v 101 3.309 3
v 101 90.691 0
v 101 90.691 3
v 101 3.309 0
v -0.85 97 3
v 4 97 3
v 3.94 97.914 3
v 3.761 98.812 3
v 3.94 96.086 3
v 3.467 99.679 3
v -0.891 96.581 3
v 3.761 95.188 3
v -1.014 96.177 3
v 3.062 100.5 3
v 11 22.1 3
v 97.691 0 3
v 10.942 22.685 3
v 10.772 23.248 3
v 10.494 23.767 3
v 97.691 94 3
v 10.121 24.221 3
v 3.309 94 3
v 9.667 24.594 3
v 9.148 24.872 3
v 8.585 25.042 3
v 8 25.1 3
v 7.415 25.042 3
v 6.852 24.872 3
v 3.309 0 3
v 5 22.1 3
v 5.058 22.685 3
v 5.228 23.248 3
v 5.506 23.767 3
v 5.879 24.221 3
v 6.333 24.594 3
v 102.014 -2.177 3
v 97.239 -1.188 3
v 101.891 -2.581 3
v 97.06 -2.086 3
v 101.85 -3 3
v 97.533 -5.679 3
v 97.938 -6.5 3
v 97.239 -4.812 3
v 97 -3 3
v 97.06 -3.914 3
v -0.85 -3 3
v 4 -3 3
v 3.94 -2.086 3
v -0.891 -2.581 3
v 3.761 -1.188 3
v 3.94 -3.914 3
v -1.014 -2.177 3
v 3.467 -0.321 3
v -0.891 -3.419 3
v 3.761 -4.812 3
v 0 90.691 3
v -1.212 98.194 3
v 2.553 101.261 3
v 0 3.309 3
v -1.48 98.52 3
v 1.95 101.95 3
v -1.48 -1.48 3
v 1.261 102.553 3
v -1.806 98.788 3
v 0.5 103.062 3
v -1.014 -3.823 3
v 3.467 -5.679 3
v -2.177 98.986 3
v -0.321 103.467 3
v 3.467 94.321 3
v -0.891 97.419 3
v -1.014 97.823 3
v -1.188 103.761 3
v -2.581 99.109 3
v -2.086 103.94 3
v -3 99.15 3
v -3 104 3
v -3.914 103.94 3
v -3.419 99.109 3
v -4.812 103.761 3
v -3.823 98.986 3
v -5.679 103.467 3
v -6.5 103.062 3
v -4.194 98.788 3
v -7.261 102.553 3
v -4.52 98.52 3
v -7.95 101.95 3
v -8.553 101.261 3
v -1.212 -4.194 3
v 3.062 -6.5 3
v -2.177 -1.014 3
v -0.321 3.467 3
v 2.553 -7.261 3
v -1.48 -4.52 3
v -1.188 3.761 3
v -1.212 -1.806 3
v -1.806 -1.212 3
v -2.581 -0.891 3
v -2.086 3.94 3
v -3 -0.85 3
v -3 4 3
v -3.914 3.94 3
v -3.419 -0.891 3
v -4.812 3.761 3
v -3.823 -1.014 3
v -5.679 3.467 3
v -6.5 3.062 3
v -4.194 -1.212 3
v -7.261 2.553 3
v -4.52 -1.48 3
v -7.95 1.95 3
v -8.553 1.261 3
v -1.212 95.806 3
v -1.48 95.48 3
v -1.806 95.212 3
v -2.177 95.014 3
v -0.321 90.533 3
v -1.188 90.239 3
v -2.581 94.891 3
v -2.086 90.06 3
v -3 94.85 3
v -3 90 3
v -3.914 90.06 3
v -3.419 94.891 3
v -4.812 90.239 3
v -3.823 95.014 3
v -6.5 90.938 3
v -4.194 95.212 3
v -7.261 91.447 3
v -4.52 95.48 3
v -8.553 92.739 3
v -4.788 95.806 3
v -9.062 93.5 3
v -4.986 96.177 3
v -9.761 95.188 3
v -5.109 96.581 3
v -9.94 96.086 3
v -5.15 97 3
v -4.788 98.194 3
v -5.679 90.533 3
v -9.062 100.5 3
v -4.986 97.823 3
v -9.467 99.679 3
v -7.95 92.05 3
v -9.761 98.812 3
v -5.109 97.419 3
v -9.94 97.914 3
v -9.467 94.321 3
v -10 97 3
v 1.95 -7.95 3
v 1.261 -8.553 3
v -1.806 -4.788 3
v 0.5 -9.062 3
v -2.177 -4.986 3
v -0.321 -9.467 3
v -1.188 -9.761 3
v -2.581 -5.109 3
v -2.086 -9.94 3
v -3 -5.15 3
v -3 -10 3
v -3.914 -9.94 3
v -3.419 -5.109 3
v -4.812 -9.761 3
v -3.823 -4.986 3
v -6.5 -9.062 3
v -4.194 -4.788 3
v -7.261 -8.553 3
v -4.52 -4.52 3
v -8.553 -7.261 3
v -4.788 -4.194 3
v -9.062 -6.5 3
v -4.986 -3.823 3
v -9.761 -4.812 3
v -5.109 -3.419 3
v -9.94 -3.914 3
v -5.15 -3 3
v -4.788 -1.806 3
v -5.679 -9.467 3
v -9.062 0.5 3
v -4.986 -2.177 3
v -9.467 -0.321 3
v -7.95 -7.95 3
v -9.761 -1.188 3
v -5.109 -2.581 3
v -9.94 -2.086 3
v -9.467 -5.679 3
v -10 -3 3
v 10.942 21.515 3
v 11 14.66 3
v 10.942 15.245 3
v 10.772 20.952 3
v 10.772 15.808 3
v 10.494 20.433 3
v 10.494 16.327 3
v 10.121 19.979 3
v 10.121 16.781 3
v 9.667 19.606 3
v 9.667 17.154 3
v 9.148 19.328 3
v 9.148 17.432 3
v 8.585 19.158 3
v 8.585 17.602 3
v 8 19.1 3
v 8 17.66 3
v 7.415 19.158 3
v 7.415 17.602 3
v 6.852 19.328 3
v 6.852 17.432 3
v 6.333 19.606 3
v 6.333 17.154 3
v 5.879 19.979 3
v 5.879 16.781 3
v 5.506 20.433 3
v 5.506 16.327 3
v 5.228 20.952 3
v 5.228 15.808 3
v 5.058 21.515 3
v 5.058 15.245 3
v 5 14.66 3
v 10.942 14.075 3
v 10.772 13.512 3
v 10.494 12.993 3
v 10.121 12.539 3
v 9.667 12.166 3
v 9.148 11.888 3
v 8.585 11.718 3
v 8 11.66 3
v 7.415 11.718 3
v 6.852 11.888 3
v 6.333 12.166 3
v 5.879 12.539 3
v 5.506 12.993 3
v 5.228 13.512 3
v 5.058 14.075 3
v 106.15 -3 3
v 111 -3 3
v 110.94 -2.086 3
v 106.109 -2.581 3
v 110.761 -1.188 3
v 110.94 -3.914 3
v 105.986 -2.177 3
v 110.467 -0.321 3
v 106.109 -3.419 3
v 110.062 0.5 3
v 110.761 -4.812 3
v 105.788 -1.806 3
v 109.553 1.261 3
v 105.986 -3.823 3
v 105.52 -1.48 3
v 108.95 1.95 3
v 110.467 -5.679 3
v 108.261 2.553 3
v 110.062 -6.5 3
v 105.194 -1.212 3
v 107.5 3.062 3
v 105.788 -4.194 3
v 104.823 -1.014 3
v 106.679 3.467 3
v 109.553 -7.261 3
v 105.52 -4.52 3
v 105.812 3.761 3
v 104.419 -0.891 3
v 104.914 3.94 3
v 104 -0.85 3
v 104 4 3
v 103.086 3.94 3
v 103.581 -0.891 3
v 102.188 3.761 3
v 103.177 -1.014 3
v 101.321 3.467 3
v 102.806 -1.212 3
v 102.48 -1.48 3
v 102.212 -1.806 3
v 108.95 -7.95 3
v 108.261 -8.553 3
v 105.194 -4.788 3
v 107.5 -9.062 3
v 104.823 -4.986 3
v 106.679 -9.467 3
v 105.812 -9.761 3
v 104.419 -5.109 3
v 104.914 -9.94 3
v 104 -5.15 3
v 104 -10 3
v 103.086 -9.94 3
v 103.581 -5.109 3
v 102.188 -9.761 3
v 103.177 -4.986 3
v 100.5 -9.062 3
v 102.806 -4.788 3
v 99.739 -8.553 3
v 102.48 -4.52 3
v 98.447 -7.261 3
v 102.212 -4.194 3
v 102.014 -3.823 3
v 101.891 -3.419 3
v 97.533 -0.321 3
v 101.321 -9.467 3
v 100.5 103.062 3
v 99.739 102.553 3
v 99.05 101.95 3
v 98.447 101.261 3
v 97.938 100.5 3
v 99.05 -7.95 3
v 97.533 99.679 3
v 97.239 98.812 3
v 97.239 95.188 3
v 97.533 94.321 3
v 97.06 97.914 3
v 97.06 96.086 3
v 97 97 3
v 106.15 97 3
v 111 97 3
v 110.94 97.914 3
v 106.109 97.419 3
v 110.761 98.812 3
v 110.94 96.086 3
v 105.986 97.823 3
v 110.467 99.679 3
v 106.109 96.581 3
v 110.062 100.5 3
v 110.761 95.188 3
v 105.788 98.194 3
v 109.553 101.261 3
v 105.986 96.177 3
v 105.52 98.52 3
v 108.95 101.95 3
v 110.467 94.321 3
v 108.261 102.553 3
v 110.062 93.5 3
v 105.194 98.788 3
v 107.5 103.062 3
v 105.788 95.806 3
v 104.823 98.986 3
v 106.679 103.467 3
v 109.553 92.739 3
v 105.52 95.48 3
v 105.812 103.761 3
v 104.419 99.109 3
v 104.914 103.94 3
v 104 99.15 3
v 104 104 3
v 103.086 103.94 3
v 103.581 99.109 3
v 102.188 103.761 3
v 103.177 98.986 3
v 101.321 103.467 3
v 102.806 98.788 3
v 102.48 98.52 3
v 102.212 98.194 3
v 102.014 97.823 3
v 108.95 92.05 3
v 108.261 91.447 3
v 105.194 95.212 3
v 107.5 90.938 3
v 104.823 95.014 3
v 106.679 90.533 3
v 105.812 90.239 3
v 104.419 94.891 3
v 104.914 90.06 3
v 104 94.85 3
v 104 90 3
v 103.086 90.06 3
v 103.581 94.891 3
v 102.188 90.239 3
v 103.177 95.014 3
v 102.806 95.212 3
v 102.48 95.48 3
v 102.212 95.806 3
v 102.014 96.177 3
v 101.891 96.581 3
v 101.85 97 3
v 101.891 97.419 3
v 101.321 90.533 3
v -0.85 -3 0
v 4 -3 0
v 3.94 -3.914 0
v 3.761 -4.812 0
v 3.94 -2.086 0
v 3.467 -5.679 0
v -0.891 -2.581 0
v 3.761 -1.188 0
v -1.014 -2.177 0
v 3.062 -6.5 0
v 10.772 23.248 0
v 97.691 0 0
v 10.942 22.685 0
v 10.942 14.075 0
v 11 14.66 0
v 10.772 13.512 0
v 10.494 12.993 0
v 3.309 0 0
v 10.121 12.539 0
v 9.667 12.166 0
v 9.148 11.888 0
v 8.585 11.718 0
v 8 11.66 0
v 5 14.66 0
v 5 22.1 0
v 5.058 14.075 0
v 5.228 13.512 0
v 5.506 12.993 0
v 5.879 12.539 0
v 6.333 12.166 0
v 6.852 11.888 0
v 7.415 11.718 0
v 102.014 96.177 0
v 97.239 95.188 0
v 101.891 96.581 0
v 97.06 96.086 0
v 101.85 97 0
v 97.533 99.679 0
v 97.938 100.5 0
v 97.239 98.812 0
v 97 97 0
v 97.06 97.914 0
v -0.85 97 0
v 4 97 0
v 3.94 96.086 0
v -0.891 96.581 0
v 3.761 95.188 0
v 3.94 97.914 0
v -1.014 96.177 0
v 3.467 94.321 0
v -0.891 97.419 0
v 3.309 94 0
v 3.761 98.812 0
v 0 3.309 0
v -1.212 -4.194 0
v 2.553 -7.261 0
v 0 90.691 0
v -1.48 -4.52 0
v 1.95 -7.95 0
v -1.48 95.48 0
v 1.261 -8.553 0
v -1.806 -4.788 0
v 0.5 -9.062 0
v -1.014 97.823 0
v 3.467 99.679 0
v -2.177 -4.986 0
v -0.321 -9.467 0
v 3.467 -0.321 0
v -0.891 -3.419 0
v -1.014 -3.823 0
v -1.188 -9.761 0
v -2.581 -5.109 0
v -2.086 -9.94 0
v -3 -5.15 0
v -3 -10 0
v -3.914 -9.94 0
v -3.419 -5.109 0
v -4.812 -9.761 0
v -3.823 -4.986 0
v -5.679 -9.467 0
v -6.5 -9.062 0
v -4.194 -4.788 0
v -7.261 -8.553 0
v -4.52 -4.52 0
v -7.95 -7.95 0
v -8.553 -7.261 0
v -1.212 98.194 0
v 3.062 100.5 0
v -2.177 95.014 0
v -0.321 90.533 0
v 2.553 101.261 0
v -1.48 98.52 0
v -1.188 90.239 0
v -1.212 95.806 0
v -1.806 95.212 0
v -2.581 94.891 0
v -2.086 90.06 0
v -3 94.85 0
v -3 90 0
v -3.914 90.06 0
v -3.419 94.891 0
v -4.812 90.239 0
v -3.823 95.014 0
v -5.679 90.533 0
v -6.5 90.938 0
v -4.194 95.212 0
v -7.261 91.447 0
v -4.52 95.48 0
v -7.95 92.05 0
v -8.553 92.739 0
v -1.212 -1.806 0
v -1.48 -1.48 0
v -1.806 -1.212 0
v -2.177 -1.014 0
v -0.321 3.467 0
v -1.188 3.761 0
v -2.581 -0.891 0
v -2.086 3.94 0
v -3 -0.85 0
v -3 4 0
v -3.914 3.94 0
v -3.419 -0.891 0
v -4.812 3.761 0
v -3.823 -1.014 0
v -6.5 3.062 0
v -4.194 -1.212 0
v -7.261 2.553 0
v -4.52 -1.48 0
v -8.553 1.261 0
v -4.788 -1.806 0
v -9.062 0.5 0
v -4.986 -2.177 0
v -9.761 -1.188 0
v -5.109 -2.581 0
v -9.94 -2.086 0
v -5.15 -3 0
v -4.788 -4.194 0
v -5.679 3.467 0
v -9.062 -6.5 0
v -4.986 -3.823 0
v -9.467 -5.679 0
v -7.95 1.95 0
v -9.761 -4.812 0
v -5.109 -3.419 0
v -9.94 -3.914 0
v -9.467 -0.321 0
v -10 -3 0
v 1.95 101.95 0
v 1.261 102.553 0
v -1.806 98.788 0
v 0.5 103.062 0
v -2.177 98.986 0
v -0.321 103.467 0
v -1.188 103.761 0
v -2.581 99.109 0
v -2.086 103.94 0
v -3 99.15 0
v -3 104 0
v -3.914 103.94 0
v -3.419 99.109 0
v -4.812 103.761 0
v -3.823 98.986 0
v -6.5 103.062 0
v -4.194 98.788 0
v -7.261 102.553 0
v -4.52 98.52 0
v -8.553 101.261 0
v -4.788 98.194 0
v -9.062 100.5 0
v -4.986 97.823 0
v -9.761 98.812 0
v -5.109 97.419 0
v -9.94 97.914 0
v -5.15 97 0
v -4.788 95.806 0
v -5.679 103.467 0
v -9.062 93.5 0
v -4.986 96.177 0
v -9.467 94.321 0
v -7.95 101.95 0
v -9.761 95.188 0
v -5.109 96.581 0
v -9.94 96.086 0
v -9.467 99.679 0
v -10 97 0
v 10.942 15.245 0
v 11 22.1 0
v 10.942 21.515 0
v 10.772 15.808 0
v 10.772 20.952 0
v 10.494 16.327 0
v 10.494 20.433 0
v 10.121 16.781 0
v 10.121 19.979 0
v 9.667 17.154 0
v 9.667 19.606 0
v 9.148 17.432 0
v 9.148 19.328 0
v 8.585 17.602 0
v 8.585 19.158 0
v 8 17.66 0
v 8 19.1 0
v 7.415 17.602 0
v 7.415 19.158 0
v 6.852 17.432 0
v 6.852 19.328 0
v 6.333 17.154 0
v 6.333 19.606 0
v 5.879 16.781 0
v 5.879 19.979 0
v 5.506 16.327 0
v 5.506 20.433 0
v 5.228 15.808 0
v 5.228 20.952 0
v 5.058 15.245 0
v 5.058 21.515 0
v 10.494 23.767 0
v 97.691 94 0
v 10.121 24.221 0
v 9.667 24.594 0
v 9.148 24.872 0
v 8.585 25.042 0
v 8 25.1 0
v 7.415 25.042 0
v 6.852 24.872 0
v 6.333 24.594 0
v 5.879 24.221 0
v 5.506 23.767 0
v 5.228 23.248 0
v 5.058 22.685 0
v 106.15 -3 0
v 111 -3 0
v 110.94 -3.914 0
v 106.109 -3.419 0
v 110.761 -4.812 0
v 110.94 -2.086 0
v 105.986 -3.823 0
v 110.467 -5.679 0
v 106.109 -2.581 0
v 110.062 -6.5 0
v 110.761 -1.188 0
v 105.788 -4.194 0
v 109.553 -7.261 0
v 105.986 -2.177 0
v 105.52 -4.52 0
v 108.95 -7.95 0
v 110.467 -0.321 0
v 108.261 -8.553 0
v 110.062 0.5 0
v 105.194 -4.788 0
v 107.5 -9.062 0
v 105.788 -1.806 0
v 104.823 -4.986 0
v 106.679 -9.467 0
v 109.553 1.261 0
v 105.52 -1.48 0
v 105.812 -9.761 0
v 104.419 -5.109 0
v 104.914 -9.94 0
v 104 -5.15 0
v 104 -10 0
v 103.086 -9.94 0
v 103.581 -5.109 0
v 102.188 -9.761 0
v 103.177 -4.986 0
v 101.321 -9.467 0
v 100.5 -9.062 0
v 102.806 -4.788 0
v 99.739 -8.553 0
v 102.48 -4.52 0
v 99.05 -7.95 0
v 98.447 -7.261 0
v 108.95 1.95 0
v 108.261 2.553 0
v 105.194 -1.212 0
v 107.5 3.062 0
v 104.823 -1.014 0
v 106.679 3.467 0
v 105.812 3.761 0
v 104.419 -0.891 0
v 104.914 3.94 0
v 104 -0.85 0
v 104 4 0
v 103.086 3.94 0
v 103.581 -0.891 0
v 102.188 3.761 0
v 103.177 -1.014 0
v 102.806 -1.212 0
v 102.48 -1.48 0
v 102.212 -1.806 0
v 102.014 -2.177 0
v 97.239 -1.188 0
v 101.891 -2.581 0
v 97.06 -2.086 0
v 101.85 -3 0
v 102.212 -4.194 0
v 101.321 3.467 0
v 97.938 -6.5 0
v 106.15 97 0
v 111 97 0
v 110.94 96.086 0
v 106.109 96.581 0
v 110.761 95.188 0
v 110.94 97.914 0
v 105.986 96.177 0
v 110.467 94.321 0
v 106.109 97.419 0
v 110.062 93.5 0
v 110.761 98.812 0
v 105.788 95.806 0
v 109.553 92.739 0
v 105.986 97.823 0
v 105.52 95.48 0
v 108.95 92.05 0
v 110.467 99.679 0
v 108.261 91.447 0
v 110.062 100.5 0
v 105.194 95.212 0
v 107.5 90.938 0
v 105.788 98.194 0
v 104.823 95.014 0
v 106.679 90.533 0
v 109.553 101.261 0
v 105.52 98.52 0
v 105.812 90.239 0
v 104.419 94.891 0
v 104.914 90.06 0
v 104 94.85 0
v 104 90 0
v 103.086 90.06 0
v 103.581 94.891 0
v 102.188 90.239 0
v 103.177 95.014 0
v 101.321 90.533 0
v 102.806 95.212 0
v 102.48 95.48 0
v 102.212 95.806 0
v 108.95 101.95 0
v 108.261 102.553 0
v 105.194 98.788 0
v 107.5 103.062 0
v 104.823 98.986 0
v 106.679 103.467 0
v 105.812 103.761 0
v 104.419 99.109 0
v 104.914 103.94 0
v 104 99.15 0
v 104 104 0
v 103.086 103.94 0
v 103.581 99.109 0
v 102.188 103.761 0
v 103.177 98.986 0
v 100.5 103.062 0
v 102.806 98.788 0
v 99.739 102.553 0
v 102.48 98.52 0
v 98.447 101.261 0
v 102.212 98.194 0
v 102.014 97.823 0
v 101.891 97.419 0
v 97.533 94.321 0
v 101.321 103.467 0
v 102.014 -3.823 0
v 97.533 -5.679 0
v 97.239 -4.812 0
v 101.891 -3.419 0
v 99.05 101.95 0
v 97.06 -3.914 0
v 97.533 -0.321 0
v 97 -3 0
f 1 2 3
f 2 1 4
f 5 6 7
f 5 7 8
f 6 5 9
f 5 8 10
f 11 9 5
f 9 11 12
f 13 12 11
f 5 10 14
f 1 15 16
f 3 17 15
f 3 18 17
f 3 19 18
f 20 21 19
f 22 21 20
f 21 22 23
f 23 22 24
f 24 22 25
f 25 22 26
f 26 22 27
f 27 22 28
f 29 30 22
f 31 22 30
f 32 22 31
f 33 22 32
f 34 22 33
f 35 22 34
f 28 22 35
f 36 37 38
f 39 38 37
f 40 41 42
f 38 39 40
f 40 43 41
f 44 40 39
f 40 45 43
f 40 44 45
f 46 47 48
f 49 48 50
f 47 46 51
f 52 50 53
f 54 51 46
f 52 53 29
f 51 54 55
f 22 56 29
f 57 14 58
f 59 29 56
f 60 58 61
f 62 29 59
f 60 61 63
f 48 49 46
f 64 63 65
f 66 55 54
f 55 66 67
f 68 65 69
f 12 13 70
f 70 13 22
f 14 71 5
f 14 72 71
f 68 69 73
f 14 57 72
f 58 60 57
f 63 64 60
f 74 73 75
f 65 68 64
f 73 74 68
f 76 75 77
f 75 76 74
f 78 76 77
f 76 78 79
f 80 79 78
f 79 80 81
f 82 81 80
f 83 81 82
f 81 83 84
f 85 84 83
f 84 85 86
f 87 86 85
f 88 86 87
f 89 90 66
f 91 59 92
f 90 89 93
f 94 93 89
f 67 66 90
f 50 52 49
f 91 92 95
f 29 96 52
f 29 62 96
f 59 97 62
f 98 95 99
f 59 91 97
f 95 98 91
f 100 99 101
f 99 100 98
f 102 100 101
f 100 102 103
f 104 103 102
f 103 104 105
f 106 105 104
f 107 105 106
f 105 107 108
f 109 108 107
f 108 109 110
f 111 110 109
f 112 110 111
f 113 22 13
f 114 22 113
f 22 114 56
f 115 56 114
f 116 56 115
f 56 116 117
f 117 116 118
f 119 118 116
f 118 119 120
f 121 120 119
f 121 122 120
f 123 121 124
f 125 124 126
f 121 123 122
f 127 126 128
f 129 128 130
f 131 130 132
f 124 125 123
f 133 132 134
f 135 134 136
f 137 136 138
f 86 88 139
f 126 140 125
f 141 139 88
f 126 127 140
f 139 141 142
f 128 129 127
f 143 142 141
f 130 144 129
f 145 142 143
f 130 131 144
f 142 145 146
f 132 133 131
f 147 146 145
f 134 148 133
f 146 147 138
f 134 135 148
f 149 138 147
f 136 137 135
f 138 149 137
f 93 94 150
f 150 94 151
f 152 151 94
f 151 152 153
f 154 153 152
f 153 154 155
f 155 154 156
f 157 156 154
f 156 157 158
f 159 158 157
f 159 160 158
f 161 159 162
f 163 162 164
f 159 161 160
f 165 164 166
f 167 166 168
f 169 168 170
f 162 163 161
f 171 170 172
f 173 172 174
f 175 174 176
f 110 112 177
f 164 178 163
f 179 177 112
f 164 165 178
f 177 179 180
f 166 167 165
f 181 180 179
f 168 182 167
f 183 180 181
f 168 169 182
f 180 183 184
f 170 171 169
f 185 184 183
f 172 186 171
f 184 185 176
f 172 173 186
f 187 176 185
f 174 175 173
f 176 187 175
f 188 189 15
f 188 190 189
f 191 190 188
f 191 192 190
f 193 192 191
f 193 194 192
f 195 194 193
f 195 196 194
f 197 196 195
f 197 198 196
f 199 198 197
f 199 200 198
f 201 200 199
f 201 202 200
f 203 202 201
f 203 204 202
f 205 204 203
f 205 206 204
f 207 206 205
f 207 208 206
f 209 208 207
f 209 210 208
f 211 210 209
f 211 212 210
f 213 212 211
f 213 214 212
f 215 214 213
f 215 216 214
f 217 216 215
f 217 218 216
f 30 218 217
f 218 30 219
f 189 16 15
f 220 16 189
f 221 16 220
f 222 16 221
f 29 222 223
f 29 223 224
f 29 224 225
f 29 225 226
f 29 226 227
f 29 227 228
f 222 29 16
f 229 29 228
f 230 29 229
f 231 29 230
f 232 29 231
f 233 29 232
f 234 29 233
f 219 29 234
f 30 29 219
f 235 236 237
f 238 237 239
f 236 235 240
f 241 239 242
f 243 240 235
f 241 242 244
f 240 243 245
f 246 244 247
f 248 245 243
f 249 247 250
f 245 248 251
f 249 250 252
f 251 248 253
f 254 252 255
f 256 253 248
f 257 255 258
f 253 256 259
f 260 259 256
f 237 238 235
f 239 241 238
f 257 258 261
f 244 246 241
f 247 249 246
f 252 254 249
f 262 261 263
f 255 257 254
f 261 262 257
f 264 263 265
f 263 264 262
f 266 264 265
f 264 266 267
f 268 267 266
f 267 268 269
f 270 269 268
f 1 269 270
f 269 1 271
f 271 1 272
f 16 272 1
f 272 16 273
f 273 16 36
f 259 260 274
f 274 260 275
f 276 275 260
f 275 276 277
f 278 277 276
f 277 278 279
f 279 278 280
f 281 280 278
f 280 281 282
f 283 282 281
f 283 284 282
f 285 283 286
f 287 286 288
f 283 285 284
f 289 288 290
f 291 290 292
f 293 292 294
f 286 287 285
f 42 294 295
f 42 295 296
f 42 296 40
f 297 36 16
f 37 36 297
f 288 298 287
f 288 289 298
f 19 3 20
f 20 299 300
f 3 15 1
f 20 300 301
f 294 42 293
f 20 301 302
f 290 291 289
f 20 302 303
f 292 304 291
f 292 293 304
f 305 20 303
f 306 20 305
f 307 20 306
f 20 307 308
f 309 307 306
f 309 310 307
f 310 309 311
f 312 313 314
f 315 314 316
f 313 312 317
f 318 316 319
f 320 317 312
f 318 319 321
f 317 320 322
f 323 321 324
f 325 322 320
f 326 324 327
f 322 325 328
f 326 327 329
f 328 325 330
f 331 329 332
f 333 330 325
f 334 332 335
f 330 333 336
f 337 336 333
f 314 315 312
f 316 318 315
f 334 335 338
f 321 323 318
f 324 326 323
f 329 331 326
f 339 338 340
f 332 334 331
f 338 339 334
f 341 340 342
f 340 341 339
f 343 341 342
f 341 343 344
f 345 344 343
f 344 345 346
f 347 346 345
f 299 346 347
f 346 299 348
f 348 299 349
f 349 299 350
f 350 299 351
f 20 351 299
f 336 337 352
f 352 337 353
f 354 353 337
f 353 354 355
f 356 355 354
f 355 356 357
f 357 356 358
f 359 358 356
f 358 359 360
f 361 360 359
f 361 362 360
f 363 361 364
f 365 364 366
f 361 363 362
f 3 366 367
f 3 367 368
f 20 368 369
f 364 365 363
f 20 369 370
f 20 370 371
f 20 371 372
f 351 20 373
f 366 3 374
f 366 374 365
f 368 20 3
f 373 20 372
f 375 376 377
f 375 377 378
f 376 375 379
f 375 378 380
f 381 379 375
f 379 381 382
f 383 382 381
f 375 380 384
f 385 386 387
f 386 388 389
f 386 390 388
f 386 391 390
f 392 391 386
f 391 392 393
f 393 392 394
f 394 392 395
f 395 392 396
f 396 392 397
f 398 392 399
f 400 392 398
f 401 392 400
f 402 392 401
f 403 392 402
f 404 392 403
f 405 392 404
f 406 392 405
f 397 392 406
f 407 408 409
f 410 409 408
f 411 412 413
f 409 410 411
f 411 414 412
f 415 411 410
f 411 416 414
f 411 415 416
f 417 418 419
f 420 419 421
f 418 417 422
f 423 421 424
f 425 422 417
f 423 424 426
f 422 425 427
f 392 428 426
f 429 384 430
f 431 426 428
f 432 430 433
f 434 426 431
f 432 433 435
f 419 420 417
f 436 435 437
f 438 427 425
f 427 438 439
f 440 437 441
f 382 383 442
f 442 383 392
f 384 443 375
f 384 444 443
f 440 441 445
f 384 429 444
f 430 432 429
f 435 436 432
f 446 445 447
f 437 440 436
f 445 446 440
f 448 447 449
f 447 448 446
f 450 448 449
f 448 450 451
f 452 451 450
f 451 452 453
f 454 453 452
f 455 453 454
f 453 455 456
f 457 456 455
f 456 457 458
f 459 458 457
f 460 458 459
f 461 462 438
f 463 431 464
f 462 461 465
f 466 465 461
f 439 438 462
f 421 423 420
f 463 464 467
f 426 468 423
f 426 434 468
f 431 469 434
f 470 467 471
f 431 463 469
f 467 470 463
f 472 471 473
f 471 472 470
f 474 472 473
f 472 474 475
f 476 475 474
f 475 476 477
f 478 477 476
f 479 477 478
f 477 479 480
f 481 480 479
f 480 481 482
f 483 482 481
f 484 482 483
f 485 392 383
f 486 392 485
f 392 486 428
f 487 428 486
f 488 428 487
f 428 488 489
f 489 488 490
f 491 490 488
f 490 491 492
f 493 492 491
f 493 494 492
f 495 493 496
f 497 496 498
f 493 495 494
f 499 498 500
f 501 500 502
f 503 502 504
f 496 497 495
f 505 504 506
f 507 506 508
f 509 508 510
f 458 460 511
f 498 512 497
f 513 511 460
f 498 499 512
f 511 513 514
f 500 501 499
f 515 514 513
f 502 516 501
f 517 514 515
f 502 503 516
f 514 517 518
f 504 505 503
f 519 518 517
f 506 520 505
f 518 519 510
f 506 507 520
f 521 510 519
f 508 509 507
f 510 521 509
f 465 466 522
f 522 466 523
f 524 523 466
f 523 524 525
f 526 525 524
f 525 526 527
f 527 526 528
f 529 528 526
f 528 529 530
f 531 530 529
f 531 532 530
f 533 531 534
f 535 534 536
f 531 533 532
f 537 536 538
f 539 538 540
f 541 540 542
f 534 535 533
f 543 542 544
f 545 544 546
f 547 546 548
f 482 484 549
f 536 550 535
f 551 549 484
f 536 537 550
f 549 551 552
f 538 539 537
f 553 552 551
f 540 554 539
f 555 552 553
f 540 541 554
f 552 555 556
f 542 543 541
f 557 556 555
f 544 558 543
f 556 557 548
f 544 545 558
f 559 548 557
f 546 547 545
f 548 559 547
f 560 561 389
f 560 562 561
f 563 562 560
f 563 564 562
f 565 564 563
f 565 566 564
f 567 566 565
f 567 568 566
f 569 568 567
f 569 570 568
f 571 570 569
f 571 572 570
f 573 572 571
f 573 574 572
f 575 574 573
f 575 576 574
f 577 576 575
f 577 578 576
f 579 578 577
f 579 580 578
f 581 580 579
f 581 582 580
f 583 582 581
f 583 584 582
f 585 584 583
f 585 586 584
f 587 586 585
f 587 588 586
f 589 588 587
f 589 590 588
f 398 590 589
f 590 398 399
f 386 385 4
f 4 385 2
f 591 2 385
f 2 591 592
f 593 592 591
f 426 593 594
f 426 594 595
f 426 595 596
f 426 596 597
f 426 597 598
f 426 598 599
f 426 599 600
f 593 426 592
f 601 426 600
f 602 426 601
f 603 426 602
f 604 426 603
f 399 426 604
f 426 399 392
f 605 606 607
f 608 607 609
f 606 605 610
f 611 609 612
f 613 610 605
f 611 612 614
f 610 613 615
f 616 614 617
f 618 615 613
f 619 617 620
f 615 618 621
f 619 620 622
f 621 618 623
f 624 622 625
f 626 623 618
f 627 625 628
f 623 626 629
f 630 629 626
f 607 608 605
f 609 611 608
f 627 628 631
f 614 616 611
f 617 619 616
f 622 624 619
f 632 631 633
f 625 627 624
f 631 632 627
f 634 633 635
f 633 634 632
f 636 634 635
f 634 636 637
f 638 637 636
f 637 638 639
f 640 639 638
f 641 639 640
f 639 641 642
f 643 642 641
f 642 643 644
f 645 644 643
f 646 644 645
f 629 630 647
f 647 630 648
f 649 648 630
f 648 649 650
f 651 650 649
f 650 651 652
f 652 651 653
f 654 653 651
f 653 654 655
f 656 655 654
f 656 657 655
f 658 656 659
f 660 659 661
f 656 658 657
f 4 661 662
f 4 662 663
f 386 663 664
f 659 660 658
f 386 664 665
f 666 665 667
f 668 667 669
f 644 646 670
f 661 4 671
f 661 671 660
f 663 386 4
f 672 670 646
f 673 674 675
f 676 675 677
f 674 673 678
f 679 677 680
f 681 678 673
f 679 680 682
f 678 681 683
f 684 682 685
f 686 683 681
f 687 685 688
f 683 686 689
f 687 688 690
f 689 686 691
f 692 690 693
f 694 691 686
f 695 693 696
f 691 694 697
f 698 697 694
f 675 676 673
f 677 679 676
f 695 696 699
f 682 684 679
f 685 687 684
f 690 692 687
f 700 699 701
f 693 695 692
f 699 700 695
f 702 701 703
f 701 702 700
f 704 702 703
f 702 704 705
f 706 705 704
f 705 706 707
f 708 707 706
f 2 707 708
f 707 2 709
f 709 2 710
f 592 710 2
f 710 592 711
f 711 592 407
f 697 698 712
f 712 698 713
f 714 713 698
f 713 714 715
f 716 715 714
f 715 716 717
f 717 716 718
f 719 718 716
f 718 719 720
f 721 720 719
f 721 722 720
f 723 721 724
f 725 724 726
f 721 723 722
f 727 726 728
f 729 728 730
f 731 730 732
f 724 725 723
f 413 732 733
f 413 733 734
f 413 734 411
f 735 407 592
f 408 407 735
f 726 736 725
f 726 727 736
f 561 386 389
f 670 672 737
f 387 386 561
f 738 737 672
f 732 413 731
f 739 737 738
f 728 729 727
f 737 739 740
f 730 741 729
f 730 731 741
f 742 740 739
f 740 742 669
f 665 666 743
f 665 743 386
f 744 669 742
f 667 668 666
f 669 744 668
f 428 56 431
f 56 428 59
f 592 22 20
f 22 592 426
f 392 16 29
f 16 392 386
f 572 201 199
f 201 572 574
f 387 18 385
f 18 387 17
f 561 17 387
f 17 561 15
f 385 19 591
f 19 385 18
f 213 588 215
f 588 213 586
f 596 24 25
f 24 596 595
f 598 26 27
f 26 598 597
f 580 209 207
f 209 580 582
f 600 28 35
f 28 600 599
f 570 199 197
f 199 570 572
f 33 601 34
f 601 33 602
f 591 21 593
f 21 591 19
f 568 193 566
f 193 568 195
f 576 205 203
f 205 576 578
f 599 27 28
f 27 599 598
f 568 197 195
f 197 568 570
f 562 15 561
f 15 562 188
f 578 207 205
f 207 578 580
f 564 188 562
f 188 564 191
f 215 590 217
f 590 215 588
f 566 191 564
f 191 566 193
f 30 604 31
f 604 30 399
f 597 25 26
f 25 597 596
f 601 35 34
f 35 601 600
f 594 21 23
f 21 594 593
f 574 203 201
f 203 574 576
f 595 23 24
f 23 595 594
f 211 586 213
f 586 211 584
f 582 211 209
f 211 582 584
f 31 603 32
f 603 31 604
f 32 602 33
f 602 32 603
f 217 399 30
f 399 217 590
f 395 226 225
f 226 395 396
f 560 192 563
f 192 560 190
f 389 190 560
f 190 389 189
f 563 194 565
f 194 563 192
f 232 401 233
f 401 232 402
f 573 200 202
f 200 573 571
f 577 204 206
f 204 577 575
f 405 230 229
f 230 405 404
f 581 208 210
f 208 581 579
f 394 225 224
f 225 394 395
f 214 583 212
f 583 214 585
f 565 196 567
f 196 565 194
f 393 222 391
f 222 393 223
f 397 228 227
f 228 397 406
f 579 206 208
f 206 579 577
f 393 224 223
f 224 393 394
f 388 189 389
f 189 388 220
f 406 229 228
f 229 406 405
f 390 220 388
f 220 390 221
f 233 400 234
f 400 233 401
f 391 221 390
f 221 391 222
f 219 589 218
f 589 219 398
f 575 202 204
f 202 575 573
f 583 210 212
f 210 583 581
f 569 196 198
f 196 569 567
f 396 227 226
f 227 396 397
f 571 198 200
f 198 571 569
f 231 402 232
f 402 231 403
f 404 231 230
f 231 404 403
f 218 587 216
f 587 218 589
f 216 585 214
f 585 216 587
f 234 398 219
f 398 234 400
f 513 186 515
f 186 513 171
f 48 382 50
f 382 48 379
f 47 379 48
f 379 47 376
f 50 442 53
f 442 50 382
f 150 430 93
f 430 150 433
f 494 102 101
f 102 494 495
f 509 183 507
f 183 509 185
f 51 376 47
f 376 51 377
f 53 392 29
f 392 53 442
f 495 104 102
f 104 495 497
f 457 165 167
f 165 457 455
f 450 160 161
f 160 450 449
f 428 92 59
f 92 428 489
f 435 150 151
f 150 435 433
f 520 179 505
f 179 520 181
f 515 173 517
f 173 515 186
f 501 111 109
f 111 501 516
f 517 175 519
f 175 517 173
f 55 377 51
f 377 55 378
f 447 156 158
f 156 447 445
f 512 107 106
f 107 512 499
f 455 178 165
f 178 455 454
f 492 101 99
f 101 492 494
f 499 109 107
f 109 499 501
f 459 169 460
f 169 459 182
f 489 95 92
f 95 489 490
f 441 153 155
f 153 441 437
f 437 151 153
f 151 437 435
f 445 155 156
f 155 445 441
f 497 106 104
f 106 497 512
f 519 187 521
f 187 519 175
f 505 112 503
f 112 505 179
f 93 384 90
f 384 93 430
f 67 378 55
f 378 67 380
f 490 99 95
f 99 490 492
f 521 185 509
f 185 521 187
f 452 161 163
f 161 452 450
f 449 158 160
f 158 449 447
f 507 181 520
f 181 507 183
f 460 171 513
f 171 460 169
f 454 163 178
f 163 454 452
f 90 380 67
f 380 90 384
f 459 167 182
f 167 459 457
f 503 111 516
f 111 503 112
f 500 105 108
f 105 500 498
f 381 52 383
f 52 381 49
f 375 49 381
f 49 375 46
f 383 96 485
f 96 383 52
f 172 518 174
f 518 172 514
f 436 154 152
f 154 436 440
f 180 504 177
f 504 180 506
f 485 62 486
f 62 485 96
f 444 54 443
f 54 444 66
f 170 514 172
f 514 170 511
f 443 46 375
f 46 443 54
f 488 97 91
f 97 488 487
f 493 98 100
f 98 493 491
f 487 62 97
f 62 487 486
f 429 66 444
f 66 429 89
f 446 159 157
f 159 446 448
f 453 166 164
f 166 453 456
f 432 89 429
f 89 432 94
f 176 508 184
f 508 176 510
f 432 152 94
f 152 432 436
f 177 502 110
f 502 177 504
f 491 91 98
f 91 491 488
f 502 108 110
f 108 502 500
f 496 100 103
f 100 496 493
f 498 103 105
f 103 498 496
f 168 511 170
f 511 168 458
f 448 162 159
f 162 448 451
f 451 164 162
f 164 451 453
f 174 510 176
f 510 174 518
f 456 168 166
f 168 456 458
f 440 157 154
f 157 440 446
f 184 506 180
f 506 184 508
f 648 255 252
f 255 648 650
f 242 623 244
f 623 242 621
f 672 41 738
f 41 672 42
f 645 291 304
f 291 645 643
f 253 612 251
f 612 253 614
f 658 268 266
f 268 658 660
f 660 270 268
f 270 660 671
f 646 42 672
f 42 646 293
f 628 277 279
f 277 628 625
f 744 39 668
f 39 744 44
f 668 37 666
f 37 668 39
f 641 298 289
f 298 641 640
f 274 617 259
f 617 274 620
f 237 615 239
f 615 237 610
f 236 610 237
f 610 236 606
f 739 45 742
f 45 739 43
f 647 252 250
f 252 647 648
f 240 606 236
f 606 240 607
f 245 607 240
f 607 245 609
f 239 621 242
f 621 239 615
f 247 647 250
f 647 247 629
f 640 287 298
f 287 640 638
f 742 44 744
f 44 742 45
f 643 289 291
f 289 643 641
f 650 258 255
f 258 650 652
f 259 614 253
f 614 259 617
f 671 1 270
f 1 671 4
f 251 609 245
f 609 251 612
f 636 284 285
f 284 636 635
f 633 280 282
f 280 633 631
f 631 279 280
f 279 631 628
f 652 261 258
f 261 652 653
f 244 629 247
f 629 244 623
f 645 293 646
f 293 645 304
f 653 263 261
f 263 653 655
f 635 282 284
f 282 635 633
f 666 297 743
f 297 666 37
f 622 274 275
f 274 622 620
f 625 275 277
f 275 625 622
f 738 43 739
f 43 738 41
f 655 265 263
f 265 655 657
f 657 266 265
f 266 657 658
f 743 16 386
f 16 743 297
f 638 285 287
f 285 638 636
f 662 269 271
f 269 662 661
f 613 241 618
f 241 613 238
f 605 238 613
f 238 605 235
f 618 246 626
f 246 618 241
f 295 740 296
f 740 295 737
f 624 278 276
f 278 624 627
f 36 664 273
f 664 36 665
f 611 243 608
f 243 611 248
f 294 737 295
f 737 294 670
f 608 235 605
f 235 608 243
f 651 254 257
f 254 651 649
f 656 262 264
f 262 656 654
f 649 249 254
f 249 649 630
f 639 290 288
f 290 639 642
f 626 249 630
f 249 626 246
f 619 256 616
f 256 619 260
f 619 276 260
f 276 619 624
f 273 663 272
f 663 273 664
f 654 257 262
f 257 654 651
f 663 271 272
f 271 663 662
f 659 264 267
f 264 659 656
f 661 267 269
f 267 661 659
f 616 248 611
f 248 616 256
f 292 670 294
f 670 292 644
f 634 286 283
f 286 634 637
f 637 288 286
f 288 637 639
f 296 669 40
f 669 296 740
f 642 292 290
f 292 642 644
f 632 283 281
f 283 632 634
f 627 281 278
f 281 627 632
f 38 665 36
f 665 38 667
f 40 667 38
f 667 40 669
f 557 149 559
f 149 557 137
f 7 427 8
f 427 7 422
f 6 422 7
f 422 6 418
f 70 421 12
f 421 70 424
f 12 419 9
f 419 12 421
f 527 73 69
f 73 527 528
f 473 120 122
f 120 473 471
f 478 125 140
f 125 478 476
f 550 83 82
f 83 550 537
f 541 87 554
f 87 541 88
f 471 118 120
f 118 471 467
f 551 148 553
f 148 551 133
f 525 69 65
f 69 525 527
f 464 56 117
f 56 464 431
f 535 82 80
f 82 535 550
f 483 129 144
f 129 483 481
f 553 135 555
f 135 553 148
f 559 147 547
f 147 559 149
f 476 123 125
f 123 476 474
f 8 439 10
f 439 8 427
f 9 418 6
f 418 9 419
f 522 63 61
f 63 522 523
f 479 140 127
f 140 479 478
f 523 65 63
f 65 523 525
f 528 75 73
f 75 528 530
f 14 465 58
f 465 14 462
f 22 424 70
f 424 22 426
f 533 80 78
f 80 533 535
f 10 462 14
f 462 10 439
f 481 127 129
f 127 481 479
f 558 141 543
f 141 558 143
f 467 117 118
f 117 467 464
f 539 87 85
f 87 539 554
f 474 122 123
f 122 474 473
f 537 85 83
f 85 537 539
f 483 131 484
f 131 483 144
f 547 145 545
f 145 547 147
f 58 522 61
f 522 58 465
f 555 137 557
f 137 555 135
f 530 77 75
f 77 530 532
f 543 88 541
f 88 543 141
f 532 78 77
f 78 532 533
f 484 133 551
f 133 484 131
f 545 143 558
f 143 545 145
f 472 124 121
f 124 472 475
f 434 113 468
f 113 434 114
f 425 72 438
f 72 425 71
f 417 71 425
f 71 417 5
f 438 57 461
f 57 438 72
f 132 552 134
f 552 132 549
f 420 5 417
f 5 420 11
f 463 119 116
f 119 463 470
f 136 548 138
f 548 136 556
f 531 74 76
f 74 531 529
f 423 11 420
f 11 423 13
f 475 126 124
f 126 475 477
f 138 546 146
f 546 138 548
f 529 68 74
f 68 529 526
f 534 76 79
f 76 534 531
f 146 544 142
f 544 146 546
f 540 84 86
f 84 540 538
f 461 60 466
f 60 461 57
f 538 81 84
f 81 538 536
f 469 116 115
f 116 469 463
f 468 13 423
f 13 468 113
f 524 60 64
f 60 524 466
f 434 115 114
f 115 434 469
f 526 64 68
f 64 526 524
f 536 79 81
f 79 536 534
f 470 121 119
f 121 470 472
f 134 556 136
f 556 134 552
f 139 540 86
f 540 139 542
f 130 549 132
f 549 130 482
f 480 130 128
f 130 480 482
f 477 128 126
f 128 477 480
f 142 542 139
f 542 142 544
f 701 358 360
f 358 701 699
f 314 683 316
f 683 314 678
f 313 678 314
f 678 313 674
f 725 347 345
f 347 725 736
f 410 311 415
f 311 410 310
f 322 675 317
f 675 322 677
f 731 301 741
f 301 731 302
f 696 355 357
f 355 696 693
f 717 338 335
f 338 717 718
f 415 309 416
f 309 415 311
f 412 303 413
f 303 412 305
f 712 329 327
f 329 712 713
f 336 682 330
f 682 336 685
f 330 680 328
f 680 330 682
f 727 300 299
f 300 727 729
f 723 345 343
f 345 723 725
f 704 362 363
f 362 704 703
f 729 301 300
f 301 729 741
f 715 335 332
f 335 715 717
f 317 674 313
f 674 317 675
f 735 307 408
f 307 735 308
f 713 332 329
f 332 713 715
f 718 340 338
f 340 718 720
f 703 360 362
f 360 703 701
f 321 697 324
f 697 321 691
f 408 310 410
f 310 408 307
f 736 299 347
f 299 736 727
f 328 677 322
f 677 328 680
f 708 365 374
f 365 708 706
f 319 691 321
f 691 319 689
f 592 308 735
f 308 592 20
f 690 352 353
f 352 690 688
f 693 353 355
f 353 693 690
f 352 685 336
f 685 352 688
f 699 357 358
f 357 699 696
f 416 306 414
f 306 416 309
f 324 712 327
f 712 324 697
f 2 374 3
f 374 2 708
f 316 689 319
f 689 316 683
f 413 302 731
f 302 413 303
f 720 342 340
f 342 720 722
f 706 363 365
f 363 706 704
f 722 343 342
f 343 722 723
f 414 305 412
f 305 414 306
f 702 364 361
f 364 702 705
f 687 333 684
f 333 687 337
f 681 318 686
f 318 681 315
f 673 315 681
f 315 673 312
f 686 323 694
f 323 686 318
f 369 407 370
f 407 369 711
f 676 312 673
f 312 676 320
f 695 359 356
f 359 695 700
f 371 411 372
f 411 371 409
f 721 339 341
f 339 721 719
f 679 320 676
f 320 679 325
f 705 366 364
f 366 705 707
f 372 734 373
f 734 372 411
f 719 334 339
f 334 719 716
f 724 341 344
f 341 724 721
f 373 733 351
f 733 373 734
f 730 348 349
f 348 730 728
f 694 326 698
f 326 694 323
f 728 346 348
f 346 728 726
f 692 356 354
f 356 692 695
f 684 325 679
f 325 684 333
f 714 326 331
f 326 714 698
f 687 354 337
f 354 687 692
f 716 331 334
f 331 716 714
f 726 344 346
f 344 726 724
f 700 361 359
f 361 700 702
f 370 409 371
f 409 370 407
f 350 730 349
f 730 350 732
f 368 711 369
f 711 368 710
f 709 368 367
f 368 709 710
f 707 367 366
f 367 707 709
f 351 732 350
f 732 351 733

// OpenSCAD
// ============================================================
// Gabinete - ModemEYSE4G_LTE_Cat1_simA7670SA - TAPA (v0B)
// Pieza separada: solo la tapa superior, con los calados de
// los LEDs D2/D3. La base esta en el archivo
// gabinete_ModemEYSE4G_base_0B.scad
// Mismo sistema de coordenadas y mismos parametros de placa
// que la base, para que las dimensiones exteriores coincidan.
//
// Cambios v7 -> v0B: alineada con gabinete_ModemEYSE4G_base_0B.scad.
//
// 1) board_x actualizado 90.3 -> 92.0mm (igual que en la base 0B,
//    tomado del PCB definitivo). Esto es lo que realmente movia las
//    "torres"/orejitas de sujecion de las esquinas: al depender de
//    outer_x = board_x + 2*(wall+clearance_xy), con el board_x viejo
//    (90.3) las 4 orejitas de la tapa quedaban en outer_x=99.3mm,
//    mientras que en la base 0B outer_x=101.0mm - un desfase de
//    1.7mm que hacia que NO coincidieran los agujeros al ensamblar.
//    Con board_x=92.0 en ambos archivos, outer_x=101.0mm en los dos
//    y las orejitas quedan exactamente alineadas.
//
// 2) mirror_x corregido de true a false, igual que en la base 0B
//    (aclaracion de Damian: la placa va con los componentes hacia
//    arriba, en su orientacion natural, coincidiendo con la vista
//    superior estandar de KiCad - no corresponde espejar). Esto
//    solo afecta los calados de LED D2/D3, no a las orejitas.
//
// 3) Nota sobre inversion Y / volteo de la tapa: la tapa y la base
//    comparten el MISMO origen (0,0) y el mismo sistema de
//    coordenadas XY - no se aplica ninguna inversion adicional de
//    eje X o Y por el hecho de que la tapa se coloque "boca abajo"
//    sobre la base. Motivo: el modulo tapa() es una simple placa
//    plana (cube[outer_x, outer_y, lid_thickness]) con agujeros
//    pasantes (orejitas y LEDs) que van derecho a traves del
//    espesor en Z - son simetricos en Z, asi que no importa cual
//    cara mire hacia arriba o hacia abajo al ensamblar: la
//    proyeccion en XY es identica desde cualquiera de las dos caras.
//    Ademas, las 4 orejitas de las esquinas (ear_centers) son
//    simetricas respecto al centro del rectangulo outer_x x outer_y,
//    asi que aunque se invirtiera un eje, el conjunto de las 4
//    posiciones cae en las mismas coordenadas (solo cambiaria cual
//    orejita fisica corresponde a cual esquina, no su ubicacion).
//    Por lo tanto, alcanza con que outer_x/outer_y (y por ende
//    board_x/board_y/wall/clearance_xy) sean identicos entre tapa y
//    base para que las torres de sujecion calcen perfectamente.
// ============================================================

// ---------- PARAMETROS DE LA PLACA ----------
board_x = 92.0;         // ancho de la placa (mm) - ACTUALIZADO v0B: igual que
                        // en base_0B.scad (PCB definitivo, 90.3 -> 92.0mm)
board_y = 85.0;         // alto de la placa (mm) - sin cambios respecto a v7

// ---------- PARAMETROS DEL GABINETE ----------
wall = 3.0;             // espesor de pared, hacia afuera (mm) - definido por Damian
lid_thickness = 3.0;    // espesor de la tapa superior - definido por Damian
clearance_xy = 1.5;     // holgura alrededor de la placa (mm)

// ---------- ESPEJADO EN X ----------
// La placa va montada con la cara de componentes hacia arriba (+Z),
// en su orientacion natural de diseno: coincide DIRECTAMENTE con la
// vista superior estandar de KiCad, sin necesidad de espejar.
// CORRECCION v0B: mirror_x estaba en true en tapa_7 (mismo supuesto
// erroneo que en base_0A). Se corrige a false, igual que en base_0B.
mirror_x = false;
function mx(x) = mirror_x ? (board_x - x) : x;

// ---------- LEDS (calado en la tapa) ----------
// Coordenadas X crudas de KiCad, ya pasadas por mx() (ahora identidad).
// Verificadas v0B contra Modulo_SIMA7670SA.kicad_pcb (definitivo):
//   D2 absoluto (118.36,78.26) -> relativo (3.50,17.60): coincide exacto.
//   D3 absoluto (118.36,70.82) -> relativo (3.50,10.16): coincide exacto.
// Sin cambios de posicion.
led_D2 = [mx(3.5), 17.6];
led_D3 = [mx(3.5), 10.16];
// LED THT de 5mm de diametro + 0.5mm de holgura por lado = 6.0mm.
// ACTUALIZADO v0B: antes 5.5mm (0.25mm/lado), se alinea con el
// criterio de holgura de 0.5mm/lado usado en el resto del gabinete.
led_hole_d = 6.0;

// ============================================================
// MODULO
// ============================================================

// Dimensiones exteriores totales de la caja (deben coincidir con las
// de gabinete_ModemEYSE4G_base_0B.scad para que la tapa calce bien)
outer_x = board_x + 2 * (wall + clearance_xy);
outer_y = board_y + 2 * (wall + clearance_xy);
offset_x = wall + clearance_xy; // offset del (0,0) de la placa dentro de la caja
offset_y = wall + clearance_xy;

// ---------- OREJITAS DE SUJECION TAPA-BASE ----------
// Mismos centros que en gabinete_ModemEYSE4G_base_0B.scad - deben
// coincidir exactamente para que los agujeros calcen con los de la base.
ear_clearance_d = 4.3;   // agujero pasante en la tapa (holgura sobre tornillo de 5/32")
ear_d = 14;               // diametro de la orejita
ear_reach = 3;            // mismo valor que en la base

ear_centers = [
    [-ear_reach, -ear_reach],
    [outer_x + ear_reach, -ear_reach],
    [-ear_reach, outer_y + ear_reach],
    [outer_x + ear_reach, outer_y + ear_reach]
];

module orejita_tapa(p) {
    difference() {
        translate([p[0], p[1], 0])
            cylinder(h = lid_thickness, d = ear_d, $fn = 48);
        translate([p[0], p[1], -1])
            cylinder(h = lid_thickness + 2, d = ear_clearance_d, $fn = 32);
    }
}

module orejitas_tapa() {
    for (p = ear_centers) orejita_tapa(p);
}

// Tapa superior: mismas dimensiones XY exteriores que la caja,
// espesor lid_thickness. Se imprime aparte y se apoya sobre el
// borde superior de las paredes.
module tapa() {
    difference() {
        cube([outer_x, outer_y, lid_thickness]);

        // Calados de los LEDs D2 y D3 (posicion real tomada del PCB)
        translate([led_D2[0] + offset_x, led_D2[1] + offset_y, -1])
            cylinder(h = lid_thickness + 2, d = led_hole_d, $fn = 32);
        translate([led_D3[0] + offset_x, led_D3[1] + offset_y, -1])
            cylinder(h = lid_thickness + 2, d = led_hole_d, $fn = 32);
    }
}

tapa();
orejitas_tapa();
